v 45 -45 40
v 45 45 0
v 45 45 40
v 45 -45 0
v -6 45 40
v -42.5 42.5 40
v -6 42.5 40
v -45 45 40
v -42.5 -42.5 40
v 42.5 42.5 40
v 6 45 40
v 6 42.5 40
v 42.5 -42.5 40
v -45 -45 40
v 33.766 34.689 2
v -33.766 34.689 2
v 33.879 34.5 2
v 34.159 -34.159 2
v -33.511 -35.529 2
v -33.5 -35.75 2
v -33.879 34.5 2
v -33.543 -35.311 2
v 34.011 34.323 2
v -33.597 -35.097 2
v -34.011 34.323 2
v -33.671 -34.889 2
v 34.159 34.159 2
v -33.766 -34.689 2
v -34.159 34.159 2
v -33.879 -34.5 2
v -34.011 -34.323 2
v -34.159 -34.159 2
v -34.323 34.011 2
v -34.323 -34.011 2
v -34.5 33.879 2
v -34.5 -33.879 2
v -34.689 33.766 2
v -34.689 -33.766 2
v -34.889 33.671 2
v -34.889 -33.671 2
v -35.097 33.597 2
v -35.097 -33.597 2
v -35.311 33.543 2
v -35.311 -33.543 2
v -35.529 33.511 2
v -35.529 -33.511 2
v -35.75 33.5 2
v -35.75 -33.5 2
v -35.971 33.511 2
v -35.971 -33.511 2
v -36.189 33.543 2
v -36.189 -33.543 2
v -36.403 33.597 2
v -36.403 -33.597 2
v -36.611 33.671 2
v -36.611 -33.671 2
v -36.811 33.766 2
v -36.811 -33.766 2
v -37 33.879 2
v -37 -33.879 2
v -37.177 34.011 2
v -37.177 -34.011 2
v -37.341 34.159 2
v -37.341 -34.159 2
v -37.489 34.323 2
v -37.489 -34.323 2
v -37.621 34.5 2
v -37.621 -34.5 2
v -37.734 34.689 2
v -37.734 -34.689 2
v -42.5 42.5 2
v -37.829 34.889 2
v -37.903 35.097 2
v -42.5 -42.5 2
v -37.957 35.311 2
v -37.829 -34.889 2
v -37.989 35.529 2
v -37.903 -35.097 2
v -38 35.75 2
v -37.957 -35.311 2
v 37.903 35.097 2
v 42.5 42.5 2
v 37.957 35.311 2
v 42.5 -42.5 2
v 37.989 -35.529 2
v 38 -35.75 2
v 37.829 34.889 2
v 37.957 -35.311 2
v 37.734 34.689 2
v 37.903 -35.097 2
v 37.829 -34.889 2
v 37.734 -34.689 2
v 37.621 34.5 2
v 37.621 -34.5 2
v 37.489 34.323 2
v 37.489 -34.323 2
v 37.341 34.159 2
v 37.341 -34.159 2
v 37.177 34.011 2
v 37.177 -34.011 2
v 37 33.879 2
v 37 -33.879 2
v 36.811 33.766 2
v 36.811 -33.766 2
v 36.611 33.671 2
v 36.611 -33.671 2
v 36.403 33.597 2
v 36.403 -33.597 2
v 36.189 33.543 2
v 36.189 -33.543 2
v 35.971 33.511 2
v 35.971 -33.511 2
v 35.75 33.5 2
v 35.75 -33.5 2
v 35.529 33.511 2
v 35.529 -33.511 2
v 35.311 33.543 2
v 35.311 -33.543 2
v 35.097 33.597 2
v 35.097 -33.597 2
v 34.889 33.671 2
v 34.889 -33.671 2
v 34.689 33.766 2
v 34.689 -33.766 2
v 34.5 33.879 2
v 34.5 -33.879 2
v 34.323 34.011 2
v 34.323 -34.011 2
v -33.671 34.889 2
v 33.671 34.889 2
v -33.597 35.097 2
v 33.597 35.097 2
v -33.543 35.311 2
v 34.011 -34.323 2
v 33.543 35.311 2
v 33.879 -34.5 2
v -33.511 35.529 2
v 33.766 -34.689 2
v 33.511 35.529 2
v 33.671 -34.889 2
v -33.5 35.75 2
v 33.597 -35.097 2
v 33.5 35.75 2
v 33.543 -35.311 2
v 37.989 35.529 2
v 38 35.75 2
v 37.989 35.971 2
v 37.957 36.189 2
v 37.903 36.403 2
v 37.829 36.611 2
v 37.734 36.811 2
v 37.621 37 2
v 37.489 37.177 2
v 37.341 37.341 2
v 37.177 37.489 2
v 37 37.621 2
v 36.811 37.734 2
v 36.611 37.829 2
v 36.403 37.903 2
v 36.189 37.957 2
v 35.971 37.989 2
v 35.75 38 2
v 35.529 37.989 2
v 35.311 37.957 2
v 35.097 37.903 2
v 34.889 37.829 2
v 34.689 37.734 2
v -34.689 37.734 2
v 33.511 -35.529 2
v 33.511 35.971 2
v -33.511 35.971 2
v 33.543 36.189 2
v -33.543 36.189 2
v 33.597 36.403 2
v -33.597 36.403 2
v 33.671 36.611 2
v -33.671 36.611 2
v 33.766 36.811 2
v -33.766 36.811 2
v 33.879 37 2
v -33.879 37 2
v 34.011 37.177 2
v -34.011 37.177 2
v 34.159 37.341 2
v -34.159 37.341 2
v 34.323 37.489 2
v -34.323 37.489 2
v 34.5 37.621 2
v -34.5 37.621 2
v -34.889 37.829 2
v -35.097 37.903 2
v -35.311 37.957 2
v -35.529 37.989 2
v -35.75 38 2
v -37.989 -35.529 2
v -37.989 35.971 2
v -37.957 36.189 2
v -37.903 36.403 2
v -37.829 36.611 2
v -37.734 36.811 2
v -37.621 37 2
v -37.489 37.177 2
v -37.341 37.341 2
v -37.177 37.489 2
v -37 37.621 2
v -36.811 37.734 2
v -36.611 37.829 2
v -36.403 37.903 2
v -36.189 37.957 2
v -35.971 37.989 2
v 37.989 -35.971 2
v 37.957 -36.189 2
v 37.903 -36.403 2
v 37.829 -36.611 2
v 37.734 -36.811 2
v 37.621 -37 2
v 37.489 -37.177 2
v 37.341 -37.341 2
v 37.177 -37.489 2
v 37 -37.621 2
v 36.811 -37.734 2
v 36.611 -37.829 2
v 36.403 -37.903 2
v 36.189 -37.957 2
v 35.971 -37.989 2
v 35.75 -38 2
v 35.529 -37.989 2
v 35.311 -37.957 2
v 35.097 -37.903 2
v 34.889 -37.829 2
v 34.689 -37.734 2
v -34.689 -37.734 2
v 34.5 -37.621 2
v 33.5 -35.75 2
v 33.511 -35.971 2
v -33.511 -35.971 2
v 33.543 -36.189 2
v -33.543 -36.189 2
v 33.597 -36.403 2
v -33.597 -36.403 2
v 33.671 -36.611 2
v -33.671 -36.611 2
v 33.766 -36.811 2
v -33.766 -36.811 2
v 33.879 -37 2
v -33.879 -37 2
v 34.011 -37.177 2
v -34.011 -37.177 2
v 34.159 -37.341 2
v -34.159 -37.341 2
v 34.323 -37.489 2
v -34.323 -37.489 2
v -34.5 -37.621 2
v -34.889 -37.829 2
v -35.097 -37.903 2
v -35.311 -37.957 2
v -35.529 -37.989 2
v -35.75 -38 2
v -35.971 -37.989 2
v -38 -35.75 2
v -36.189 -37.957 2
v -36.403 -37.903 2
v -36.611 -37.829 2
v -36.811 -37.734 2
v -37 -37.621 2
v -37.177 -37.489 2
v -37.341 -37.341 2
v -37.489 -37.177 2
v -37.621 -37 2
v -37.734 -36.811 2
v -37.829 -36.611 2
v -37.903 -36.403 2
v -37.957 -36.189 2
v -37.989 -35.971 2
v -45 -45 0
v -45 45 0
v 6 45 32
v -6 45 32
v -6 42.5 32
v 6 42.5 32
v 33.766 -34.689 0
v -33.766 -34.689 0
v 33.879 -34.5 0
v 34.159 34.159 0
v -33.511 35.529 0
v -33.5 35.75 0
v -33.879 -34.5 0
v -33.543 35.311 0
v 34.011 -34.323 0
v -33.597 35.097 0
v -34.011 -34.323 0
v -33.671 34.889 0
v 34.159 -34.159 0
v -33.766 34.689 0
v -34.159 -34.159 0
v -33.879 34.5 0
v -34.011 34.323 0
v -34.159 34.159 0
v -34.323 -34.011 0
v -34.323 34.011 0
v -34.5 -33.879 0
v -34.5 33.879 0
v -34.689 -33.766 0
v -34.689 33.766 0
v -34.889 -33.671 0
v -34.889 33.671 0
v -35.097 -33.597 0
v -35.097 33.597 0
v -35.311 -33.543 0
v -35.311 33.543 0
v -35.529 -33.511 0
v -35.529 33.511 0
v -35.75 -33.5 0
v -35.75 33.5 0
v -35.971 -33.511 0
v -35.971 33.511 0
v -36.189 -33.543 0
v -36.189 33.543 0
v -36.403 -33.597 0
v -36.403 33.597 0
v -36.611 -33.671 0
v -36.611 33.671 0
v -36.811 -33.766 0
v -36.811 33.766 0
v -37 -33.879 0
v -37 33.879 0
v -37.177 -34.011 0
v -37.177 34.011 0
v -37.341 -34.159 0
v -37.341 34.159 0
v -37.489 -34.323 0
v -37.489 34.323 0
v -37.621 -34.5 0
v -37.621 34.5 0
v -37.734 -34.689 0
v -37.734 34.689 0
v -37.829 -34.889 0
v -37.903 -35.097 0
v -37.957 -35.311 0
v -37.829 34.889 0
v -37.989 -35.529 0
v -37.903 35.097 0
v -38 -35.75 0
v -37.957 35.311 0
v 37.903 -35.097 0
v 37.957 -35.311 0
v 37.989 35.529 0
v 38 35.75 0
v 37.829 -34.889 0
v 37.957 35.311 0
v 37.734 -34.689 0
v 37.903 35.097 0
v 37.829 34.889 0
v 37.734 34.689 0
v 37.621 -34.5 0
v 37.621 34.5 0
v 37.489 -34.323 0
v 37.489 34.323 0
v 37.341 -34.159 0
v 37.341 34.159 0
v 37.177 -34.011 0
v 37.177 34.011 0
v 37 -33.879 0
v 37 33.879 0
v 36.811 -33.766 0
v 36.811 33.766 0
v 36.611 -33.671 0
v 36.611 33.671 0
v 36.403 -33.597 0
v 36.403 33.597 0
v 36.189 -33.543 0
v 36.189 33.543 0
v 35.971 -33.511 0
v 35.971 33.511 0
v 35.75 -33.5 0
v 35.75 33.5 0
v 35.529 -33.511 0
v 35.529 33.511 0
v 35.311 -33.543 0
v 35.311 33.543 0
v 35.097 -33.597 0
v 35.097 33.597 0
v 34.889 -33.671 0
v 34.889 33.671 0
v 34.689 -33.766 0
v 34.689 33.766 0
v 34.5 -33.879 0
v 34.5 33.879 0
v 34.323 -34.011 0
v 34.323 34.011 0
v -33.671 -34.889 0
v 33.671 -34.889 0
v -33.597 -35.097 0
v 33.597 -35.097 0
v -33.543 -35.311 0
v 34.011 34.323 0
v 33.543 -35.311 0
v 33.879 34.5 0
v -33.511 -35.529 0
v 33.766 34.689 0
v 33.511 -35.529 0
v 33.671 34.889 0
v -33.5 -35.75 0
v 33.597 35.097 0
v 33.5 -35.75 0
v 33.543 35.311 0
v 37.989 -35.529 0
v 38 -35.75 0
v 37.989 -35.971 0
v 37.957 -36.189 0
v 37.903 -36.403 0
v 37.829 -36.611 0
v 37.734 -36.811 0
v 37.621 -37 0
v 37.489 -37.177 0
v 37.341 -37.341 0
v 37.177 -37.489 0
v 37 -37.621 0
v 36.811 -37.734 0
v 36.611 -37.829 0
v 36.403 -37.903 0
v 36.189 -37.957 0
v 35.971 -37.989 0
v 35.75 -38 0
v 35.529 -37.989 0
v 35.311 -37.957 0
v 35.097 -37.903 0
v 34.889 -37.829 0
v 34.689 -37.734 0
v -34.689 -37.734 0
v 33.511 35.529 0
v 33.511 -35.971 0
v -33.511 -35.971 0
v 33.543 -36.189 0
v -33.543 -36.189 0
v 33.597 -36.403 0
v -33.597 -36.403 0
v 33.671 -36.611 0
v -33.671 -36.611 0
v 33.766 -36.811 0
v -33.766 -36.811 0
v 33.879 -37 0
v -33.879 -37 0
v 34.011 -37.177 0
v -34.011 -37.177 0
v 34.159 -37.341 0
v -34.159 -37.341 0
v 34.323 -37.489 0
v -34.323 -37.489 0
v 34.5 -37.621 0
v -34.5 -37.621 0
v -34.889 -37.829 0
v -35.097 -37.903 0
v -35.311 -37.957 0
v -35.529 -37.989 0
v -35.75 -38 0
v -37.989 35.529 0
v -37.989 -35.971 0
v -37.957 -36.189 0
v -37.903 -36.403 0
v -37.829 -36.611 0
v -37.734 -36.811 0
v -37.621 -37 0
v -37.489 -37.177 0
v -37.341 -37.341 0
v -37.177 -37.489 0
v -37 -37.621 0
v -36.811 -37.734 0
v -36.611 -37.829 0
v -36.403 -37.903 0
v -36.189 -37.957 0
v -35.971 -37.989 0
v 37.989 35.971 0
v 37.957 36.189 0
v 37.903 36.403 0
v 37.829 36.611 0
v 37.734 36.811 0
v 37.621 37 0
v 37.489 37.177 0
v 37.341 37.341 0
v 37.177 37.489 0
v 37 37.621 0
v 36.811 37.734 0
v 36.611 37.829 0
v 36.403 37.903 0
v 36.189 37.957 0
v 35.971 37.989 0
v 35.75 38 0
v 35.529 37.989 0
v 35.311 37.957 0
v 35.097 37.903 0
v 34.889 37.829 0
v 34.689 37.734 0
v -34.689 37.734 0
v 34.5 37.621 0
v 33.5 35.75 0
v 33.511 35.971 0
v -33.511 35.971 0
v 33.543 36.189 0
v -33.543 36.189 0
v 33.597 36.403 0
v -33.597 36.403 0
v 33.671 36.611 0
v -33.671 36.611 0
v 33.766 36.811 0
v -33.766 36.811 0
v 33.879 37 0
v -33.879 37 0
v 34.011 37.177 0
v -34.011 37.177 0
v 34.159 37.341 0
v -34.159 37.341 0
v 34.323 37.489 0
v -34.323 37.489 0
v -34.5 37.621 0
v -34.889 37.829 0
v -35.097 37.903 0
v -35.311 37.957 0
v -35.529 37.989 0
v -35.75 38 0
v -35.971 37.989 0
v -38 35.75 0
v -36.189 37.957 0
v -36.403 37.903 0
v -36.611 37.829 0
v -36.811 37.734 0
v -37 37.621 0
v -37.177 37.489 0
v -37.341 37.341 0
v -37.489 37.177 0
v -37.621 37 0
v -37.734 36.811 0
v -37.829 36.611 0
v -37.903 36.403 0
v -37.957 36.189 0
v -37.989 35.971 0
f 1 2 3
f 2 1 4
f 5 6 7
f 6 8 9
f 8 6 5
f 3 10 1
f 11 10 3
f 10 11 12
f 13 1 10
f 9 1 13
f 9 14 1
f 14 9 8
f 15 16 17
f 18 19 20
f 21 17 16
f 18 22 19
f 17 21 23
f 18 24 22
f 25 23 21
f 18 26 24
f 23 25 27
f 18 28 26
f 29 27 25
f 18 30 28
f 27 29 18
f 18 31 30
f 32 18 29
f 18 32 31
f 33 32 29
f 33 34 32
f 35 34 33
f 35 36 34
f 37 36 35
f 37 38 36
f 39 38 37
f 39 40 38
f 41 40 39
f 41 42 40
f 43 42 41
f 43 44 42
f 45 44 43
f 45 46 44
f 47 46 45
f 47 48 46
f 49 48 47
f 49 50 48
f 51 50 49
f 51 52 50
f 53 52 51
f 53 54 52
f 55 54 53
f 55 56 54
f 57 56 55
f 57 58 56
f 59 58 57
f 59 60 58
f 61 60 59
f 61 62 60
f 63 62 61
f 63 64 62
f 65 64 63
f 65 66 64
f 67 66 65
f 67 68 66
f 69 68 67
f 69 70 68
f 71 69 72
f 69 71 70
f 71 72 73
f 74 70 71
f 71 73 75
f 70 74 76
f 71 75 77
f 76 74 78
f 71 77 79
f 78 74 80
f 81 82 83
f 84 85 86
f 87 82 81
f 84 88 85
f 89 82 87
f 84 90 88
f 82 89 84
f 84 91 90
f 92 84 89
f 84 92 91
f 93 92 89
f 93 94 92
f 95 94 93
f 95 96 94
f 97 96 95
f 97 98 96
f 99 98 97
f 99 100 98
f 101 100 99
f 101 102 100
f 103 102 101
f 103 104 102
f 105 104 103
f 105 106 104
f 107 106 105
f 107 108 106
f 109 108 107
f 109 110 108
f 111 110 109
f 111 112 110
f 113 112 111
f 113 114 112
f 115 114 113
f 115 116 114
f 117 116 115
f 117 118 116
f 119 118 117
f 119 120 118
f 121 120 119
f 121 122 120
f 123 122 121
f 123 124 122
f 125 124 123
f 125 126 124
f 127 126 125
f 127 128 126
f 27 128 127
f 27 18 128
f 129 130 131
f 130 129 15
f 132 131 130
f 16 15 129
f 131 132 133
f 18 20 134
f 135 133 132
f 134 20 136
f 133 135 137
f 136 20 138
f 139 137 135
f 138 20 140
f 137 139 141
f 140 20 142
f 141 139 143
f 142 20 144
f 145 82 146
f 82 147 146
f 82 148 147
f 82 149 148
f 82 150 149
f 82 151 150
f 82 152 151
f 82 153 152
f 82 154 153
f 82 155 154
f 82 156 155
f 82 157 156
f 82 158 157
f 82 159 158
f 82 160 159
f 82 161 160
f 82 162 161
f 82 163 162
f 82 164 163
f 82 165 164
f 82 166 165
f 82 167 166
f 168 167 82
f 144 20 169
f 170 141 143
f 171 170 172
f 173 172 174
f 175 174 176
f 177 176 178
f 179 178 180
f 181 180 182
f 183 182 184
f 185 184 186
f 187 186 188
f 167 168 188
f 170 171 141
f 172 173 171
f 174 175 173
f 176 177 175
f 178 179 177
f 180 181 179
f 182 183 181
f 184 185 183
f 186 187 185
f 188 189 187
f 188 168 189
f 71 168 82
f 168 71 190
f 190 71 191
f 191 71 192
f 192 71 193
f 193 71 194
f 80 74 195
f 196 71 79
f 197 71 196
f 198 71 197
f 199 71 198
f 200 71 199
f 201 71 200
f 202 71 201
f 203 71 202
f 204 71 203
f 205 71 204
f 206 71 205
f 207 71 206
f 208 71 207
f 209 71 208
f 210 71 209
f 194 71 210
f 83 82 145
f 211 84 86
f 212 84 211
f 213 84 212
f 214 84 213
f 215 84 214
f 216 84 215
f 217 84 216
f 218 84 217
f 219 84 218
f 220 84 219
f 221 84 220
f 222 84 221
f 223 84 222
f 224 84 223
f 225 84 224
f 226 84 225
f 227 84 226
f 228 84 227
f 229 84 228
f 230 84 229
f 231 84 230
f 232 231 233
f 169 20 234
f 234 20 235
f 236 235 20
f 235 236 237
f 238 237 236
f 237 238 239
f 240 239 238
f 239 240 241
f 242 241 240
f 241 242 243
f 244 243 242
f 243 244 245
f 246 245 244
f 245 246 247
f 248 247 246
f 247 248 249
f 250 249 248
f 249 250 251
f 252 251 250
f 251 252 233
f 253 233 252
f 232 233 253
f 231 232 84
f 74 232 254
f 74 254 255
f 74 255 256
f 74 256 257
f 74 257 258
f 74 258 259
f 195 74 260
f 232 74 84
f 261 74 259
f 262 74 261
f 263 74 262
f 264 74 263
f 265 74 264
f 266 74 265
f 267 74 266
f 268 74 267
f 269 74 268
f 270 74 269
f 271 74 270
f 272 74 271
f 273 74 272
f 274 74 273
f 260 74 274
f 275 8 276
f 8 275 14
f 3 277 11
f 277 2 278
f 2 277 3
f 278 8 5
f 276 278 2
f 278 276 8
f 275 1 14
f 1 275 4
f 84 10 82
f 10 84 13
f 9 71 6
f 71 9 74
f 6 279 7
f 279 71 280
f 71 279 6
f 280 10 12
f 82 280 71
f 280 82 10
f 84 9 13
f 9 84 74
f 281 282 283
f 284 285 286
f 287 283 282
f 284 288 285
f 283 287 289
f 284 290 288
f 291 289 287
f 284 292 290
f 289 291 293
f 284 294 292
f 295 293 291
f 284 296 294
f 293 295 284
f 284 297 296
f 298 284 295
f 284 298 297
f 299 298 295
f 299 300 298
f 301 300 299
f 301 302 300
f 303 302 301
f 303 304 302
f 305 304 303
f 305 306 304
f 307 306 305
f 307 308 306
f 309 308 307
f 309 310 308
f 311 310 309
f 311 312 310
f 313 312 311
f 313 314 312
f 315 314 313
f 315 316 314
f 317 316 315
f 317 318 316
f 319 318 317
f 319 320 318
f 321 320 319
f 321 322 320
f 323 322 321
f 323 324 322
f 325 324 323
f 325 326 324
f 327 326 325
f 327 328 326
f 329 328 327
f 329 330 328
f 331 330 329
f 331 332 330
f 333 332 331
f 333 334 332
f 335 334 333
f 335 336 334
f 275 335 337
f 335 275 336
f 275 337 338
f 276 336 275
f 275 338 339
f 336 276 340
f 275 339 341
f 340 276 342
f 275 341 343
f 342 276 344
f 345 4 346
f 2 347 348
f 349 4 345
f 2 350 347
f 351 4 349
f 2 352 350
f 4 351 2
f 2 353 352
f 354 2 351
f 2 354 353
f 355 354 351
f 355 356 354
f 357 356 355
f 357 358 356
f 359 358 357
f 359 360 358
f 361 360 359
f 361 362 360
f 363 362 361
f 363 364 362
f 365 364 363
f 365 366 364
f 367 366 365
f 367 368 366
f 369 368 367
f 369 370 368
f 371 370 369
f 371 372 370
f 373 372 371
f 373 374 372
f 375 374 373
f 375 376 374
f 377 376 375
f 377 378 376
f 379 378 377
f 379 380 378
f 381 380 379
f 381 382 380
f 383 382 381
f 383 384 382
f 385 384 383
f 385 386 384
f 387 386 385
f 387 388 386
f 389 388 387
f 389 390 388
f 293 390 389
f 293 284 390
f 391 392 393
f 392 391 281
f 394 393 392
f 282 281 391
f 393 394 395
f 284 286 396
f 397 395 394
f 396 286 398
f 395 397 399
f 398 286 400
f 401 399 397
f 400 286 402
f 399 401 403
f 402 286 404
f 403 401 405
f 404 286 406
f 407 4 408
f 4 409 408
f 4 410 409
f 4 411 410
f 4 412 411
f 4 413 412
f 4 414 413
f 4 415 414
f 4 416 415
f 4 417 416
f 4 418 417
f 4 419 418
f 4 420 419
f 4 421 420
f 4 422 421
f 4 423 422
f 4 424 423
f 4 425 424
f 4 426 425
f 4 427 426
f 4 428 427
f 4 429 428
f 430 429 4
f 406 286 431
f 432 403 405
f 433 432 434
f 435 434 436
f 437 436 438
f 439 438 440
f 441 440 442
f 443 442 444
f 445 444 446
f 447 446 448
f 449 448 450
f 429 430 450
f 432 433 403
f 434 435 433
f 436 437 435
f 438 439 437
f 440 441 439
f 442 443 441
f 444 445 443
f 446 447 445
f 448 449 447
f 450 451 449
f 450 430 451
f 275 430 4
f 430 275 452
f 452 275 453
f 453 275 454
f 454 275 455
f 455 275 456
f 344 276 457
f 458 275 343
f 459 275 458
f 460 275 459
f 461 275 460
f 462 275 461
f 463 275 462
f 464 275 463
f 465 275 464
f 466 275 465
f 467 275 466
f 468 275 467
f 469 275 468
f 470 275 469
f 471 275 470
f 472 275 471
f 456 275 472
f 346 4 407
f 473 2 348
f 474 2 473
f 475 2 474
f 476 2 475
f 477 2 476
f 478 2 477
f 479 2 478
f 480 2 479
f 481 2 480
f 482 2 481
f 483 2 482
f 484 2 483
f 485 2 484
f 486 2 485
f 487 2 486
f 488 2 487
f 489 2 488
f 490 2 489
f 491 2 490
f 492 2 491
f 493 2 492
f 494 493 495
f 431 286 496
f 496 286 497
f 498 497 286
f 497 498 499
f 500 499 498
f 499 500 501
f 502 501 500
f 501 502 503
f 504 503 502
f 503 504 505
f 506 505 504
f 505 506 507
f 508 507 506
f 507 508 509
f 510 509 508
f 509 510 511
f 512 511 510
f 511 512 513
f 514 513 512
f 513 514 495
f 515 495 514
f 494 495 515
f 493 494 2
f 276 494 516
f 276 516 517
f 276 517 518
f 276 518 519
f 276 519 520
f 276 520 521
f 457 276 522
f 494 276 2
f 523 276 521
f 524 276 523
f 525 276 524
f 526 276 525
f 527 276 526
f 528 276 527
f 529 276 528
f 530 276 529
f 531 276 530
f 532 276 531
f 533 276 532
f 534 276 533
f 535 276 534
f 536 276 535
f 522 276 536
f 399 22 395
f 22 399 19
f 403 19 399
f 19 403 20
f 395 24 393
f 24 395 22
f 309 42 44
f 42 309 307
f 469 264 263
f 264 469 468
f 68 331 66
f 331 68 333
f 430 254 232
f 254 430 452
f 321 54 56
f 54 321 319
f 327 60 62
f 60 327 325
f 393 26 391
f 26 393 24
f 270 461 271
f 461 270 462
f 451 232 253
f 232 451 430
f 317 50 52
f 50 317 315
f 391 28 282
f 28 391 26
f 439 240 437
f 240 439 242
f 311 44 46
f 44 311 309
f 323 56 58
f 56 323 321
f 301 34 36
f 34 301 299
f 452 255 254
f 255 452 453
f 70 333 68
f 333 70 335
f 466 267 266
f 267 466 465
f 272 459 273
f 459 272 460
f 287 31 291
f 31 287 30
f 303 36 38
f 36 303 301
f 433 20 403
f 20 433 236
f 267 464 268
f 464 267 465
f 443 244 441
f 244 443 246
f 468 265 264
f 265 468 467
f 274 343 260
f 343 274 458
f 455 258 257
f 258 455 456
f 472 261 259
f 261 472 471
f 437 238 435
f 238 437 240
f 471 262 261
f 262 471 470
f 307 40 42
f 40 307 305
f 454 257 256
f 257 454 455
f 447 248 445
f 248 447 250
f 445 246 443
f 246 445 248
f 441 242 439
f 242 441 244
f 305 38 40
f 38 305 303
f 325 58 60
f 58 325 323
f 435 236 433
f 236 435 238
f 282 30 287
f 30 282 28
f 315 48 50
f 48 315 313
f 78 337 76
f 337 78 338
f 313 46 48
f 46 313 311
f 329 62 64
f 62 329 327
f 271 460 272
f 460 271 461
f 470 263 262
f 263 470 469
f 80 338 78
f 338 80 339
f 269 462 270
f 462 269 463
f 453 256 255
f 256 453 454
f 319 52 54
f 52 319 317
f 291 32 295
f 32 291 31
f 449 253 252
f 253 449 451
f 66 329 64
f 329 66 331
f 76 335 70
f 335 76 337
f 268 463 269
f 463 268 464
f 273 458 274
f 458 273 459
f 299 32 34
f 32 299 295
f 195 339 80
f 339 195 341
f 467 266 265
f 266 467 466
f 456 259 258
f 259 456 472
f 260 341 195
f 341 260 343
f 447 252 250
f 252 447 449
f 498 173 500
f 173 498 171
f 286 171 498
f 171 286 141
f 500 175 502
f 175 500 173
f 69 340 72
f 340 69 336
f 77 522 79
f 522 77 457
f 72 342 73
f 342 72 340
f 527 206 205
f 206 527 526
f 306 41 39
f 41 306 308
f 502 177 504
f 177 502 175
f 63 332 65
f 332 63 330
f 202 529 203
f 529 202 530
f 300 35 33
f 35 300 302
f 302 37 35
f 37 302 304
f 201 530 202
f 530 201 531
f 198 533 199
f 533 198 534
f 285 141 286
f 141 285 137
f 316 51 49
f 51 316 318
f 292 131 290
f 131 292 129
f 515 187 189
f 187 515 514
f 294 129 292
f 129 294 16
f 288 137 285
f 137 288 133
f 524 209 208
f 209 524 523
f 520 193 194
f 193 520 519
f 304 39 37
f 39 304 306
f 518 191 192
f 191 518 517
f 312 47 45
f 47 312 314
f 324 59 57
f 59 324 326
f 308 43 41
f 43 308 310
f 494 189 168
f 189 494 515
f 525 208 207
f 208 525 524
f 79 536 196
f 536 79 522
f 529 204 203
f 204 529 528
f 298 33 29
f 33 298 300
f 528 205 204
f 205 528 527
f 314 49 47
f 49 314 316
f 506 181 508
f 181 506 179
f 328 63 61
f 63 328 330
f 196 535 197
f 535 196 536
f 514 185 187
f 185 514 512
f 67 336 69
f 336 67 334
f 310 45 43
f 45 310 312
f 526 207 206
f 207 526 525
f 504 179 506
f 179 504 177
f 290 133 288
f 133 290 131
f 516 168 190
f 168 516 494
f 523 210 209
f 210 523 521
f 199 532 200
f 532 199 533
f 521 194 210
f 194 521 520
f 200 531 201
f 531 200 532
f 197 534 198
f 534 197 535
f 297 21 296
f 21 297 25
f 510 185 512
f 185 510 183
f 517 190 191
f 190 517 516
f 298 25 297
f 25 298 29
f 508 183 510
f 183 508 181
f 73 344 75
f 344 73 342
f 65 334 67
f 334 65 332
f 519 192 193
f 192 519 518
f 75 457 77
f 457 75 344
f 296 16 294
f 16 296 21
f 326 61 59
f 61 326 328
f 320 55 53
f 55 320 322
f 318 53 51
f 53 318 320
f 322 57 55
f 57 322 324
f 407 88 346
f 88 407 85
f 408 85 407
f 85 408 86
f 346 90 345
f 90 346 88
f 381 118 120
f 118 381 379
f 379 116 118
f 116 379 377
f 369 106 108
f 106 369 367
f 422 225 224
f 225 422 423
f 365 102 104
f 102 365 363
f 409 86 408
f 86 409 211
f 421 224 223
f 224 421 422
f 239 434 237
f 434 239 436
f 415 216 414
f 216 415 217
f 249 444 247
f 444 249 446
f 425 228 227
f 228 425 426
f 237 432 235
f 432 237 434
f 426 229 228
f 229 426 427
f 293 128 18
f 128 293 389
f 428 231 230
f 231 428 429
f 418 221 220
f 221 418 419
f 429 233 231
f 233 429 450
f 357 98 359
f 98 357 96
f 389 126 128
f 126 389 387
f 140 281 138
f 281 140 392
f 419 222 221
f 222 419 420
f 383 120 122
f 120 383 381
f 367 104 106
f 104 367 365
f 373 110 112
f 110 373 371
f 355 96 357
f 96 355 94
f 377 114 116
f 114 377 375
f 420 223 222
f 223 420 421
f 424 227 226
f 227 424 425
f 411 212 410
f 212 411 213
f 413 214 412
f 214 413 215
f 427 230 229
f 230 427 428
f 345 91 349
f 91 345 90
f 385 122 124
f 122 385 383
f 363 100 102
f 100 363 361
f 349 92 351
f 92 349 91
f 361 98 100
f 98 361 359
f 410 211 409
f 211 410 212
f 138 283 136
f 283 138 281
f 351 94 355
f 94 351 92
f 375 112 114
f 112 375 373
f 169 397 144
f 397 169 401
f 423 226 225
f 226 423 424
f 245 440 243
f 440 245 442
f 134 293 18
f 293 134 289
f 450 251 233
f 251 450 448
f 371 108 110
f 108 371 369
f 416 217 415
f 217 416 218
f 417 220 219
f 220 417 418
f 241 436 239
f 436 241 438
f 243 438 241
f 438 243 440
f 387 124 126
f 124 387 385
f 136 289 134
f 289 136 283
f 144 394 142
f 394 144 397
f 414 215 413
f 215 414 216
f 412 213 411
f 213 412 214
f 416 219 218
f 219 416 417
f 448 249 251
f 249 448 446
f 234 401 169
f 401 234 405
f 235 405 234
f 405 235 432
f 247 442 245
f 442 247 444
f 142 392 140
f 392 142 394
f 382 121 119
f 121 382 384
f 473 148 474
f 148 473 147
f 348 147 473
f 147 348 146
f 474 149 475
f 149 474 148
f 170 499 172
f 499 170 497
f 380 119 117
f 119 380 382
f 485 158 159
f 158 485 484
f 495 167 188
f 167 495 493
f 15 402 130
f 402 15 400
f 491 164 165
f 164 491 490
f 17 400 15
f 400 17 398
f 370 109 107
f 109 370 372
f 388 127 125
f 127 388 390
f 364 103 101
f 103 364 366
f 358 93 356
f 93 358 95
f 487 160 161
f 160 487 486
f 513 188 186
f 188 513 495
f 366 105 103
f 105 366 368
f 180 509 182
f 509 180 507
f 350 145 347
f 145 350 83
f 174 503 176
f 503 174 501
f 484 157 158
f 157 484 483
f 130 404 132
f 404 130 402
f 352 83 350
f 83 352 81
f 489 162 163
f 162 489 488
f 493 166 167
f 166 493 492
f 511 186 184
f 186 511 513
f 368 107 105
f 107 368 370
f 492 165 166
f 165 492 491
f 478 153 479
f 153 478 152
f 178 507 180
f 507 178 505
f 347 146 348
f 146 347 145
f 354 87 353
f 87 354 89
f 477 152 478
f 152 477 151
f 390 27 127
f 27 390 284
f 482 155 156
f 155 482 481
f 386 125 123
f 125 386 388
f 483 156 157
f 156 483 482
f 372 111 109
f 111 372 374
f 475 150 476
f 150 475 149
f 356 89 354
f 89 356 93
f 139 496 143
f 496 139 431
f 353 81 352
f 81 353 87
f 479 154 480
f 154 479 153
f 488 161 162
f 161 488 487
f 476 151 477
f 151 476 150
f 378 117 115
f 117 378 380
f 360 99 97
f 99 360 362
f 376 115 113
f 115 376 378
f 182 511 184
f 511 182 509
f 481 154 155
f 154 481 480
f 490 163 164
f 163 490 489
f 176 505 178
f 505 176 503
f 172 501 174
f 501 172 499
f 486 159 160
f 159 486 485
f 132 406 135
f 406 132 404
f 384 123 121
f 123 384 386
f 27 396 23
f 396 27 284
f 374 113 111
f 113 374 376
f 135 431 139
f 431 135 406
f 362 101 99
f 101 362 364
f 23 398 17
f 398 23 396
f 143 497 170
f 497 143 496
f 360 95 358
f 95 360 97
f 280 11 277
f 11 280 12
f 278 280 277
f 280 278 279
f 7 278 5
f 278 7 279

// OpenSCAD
// --- Dimensions (mm) ---
outer_width = 90;          // Outer width and length of the box
outer_length = 90;         // Outer length and width of the box
wall_thickness = 2.5;       // Thickness of the four vertical walls
top_plate_thickness = 2;    // Thickness of the top plate (the stirring surface)
total_height = 40;         // Total height of the housing
screw_hole_diameter = 4.5;  // Diameter for M4 screw holes
screw_pattern_size = 71.5;  // Distance between screw holes (square pattern)
notch_width = 12;          // Width of the cable notch
notch_height = 8;          // Height of the notch (from z=32 to z=40)

// --- Constants ---
$fn = 64;

// --- Implementation ---

// The part is modeled upside down: 
// The top plate (stirring surface) is at Z = 0 to Z = 2.
// The walls rise from Z = 2 to Z = 40.
// Centered on the origin in X and Y.

module housing() {
    difference() {
        // Main Body
        union() {
            // The Top Plate (Base of the box in this orientation)
            // Centered on XY
            translate([-outer_width/2, -outer_length/2, 0])
            cube([outer_width, outer_length, top_plate_thickness]);
            
            // The Four Walls
            translate([-outer_width/2, -outer_length/2, top_plate_thickness])
            difference() {
                // Outer boundary of the walls
                cube([outer_width, outer_length, total_height - top_plate_thickness]);
                
                // Hollow out the inside
                // Subtracting a cube to create the hollow interior
                translate([wall_thickness, wall_thickness, -0.01])
                cube([outer_width - 2*wall_thickness, outer_length - 2*wall_thickness, total_height]);
            }
        }

        // 1. Screw Holes (through the top plate)
        // Centered on the plate. Pattern is 71.5mm.
        // Holes are drilled through the top plate (Z=0 to Z=2).
        for (i = [-1, 1], j = [-1, 1]) {
            translate([
                i * screw_pattern_size / 2, 
                j * screw_pattern_size / 2, 
                -0.01
            ])
            cylinder(d = screw_hole_diameter, h = top_plate_thickness + 0.02);
        }

        // 2. Cable Notch
        // Located in one wall, centered along the wall, reaching 8mm down from the open edge.
        // Open edge is at Z = 40. Notch is from Z = 32 to Z = 40.
        // We place it on the wall at Y = outer_length/2.
        // The notch must cut through the wall thickness.
        translate([
            -notch_width/2, 
            outer_length/2 - wall_thickness - 0.1, 
            total_height - notch_height
        ])
        cube([notch_width, wall_thickness + 0.2, notch_height + 0.1]);
    }
}

// Render the part
housing();
